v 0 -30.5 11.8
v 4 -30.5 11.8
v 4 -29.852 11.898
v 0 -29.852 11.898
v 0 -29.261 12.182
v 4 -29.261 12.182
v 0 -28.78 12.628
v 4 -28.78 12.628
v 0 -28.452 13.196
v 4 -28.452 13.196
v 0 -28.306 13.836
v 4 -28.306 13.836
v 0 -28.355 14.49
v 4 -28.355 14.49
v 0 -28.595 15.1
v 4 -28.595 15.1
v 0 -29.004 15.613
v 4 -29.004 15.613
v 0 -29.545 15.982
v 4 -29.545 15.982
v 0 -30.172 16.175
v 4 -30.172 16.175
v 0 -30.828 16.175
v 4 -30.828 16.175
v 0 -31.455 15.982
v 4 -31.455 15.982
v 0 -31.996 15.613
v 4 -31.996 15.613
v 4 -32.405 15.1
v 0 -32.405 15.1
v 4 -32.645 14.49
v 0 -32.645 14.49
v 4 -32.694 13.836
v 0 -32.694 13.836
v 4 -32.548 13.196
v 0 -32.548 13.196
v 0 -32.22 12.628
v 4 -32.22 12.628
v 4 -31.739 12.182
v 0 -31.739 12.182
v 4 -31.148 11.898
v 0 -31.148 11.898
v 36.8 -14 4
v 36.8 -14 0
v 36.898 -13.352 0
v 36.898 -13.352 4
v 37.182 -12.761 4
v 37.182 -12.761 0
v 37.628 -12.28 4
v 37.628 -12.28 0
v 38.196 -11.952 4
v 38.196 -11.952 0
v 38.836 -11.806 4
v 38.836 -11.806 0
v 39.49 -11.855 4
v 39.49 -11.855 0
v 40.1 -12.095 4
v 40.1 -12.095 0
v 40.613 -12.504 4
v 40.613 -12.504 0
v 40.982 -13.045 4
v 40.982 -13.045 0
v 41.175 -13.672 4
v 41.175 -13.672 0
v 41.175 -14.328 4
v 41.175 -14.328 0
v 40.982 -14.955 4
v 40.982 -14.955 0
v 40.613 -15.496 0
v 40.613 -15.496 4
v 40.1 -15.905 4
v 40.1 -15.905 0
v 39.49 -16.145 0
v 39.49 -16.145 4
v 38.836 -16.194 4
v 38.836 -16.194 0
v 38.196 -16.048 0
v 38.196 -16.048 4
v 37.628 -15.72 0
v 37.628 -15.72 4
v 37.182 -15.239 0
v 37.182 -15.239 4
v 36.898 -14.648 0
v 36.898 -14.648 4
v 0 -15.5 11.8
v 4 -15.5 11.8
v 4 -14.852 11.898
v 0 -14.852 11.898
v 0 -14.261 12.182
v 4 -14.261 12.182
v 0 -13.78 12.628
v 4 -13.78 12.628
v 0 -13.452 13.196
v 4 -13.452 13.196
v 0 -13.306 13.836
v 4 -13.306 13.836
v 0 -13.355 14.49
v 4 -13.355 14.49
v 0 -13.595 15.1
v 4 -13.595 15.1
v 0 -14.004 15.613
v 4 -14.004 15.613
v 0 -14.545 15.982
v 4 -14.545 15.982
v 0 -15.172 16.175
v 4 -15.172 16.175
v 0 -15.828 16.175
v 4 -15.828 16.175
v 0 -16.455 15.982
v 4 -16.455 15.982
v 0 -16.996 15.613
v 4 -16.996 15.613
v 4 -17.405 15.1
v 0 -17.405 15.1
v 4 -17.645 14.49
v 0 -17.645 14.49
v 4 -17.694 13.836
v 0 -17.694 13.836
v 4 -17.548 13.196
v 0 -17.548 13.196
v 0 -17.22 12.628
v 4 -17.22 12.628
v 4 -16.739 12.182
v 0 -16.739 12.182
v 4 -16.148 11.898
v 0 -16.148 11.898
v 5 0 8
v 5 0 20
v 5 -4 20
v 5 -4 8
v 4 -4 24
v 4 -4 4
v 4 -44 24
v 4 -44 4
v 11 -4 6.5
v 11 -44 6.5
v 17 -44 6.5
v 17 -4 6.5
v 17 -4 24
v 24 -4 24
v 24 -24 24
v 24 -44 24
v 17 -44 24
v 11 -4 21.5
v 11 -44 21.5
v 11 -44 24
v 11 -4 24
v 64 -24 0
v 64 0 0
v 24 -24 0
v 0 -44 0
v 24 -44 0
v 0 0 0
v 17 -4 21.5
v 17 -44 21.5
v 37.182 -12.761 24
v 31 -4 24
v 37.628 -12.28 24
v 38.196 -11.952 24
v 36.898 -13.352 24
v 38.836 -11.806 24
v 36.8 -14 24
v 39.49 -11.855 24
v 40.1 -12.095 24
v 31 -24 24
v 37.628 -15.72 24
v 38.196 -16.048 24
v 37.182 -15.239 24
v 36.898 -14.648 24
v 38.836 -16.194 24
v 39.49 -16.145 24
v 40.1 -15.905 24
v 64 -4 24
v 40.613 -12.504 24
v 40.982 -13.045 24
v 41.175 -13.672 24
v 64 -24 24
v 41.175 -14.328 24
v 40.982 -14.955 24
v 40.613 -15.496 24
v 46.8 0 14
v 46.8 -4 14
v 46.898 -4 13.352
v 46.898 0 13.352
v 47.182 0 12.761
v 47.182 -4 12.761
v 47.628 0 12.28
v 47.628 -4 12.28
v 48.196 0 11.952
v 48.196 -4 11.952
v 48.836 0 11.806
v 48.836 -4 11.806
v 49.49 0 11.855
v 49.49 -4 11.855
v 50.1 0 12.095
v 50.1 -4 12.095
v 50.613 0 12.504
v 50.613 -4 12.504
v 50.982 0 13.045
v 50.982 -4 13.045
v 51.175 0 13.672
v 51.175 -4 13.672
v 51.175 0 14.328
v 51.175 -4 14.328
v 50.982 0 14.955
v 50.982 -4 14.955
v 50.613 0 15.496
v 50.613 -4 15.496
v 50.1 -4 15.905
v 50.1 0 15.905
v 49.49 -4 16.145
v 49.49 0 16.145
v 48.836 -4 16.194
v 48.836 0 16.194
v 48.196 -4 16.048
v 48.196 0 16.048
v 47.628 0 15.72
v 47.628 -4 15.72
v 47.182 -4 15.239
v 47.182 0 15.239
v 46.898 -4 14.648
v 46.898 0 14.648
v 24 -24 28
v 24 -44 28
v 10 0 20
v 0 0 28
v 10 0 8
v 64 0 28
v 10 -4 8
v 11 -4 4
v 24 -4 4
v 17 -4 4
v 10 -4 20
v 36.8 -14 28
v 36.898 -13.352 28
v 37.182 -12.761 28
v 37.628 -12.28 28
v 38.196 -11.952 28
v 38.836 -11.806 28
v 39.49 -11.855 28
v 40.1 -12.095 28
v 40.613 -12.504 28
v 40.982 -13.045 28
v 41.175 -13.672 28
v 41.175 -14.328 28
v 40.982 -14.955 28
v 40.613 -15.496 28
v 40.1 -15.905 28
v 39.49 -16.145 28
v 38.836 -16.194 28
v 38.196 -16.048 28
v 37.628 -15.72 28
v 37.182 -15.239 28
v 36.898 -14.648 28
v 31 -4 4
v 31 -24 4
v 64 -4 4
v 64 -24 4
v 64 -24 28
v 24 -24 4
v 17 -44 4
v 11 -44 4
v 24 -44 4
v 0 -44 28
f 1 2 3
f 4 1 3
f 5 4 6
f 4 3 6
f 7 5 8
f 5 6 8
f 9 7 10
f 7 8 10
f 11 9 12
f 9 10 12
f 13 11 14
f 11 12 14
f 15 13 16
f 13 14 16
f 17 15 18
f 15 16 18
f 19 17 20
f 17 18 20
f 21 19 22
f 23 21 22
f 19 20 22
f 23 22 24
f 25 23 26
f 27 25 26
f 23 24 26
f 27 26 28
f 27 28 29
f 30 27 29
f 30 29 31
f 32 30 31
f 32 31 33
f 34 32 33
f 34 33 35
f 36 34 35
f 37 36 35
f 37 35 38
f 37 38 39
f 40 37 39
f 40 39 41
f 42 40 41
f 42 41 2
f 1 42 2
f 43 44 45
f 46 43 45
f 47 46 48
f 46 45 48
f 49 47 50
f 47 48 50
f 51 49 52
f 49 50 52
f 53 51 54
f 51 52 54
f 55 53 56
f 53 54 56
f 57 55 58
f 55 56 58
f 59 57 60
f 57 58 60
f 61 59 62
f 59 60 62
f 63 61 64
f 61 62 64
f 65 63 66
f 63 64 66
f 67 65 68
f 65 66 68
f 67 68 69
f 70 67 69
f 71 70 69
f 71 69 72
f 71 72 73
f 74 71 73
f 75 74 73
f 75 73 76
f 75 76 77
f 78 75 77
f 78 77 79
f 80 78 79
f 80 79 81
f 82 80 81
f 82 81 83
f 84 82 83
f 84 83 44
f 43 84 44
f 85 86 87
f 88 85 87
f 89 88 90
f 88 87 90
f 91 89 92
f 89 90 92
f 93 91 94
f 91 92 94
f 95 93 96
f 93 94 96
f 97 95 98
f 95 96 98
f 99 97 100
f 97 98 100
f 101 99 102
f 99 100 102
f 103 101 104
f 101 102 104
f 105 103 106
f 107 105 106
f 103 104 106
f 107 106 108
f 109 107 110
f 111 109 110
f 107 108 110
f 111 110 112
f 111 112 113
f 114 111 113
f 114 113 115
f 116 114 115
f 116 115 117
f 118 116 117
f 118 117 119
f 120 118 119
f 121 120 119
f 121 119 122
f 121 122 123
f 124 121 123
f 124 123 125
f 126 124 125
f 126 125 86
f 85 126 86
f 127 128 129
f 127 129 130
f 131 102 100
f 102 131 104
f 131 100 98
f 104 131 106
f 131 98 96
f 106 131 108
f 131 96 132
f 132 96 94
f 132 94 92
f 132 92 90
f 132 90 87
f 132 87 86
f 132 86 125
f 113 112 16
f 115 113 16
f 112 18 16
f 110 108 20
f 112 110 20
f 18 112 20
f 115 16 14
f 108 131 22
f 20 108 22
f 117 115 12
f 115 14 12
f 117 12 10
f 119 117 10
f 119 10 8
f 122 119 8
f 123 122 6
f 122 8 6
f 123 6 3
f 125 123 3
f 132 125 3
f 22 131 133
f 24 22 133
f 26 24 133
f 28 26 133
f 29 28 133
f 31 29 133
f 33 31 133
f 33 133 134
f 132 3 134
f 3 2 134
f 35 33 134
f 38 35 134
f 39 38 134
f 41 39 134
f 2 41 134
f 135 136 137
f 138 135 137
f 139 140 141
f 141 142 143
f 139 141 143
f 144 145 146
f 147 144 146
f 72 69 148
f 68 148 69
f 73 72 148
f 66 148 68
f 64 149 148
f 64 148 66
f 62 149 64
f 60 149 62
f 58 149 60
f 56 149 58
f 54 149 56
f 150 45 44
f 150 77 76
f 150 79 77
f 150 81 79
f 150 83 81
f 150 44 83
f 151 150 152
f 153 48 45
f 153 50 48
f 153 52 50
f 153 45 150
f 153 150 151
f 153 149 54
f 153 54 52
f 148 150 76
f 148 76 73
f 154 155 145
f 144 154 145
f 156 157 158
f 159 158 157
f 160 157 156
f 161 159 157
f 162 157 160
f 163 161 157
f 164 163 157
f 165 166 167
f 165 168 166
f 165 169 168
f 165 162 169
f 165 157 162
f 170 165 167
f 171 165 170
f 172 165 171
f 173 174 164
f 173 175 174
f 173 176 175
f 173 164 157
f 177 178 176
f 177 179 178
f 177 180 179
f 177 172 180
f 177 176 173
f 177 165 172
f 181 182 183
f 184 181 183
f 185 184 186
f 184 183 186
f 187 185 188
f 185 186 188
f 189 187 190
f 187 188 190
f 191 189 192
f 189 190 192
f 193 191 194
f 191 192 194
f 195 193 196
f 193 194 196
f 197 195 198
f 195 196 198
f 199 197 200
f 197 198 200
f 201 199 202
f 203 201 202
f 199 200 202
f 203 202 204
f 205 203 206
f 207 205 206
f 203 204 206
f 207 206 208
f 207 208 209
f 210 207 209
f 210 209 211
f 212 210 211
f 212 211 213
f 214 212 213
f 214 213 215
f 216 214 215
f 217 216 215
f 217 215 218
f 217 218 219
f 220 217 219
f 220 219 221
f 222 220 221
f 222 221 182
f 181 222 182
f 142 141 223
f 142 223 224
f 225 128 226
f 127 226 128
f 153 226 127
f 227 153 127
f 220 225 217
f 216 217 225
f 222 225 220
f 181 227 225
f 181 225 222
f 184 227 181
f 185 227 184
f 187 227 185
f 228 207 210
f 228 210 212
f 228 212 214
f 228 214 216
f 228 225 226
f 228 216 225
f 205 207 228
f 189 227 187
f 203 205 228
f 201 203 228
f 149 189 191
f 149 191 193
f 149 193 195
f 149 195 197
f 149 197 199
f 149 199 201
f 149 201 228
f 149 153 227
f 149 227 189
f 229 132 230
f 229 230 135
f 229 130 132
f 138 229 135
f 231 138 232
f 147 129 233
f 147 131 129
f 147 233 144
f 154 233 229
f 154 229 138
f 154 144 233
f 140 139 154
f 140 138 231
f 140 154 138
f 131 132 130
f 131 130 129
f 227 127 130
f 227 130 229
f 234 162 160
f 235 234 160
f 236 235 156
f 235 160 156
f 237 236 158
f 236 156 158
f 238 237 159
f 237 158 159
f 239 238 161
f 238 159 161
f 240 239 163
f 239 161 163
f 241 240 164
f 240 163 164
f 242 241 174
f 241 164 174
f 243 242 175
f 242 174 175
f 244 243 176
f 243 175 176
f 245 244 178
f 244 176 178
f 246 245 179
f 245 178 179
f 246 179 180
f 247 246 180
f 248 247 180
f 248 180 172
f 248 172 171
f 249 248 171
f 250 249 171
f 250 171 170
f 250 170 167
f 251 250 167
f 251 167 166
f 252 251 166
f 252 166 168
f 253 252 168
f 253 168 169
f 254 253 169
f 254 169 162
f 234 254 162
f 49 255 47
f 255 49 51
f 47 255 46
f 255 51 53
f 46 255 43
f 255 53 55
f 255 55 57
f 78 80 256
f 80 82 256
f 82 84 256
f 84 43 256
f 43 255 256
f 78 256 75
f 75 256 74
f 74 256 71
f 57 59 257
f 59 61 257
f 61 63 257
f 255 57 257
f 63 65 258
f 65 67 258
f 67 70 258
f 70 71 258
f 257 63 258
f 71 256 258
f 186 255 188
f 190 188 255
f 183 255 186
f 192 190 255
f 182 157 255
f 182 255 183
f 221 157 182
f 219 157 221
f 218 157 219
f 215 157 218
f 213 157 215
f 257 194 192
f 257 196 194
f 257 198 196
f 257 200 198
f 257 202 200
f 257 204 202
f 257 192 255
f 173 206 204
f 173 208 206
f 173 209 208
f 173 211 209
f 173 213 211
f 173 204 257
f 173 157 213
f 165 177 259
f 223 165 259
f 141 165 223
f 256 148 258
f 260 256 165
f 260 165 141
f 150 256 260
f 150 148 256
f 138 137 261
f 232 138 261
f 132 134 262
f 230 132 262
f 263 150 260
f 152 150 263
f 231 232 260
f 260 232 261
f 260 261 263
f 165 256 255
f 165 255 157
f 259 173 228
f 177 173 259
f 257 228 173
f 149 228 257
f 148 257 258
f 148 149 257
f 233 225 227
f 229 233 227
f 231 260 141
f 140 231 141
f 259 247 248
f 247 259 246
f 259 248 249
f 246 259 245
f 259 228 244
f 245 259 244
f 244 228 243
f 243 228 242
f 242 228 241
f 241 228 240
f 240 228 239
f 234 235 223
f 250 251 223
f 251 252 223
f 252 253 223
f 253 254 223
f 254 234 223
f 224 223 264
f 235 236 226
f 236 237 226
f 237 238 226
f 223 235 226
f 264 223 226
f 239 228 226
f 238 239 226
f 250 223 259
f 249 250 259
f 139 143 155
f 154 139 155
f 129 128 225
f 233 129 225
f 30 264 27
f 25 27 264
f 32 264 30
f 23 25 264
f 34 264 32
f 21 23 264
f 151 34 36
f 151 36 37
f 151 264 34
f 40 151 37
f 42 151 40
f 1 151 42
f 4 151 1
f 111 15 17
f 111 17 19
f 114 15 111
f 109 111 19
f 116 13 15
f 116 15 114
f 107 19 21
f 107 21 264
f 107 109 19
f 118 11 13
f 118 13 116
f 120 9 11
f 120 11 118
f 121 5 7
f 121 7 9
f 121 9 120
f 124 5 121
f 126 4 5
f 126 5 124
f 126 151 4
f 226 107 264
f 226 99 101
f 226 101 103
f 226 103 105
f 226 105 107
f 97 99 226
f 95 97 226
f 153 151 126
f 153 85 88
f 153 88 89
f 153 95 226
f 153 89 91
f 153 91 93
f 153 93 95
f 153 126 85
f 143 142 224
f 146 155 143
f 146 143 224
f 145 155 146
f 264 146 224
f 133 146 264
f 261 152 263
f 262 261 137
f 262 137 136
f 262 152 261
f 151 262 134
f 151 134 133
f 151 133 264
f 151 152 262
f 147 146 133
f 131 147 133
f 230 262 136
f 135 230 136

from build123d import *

# Parameters (mm, degrees)
BOSS_EXTRU_1_DEPTH      = 28
ENL_V_MAT_EXTRU_1_DEPTH = 40
ESQUISSE3_W             = 33
ESQUISSE3_H             = 20
ENL_V_MAT_EXTRU_2_DEPTH = 20
D_GAGEMENT_M41_D        = 4.4
D_GAGEMENT_M41_DEPTH    = 5
D_GAGEMENT_M42_D        = 4.4
D_GAGEMENT_M43_D        = 4.4
D_GAGEMENT_M43_DEPTH    = 5
ESQUISSE13_W            = 5
ESQUISSE13_H            = 12
ENL_V_MAT_EXTRU_4_DEPTH = 10


with BuildPart() as part:
    # Esquisse1 → Boss.-Extru.1 (new body)
    with BuildSketch(Plane.XY):
        Polygon((0, 0), (64, 0), (64, -24), (24, -24), (24, -44), (0, -44), align=None)
    extrude(amount=BOSS_EXTRU_1_DEPTH)

    # Esquisse2 → Enlèv. mat.-Extru.1 (cut)
    with BuildSketch(Plane.XZ.offset(44)):
        Polygon((24, 24), (17, 24), (17, 21.5), (11, 21.5), (11, 24), (4, 24), (4, 4), (11, 4), (11, 6.5), (17, 6.5), (17, 4), (24, 4), align=None)
    extrude(amount=-ENL_V_MAT_EXTRU_1_DEPTH, mode=Mode.SUBTRACT)

    # Esquisse3 → Enlèv. mat.-Extru.2 (cut)
    with BuildSketch(Plane.XZ.offset(24)):
        with Locations((47.5, 14)):
            Rectangle(ESQUISSE3_W, ESQUISSE3_H)
    extrude(amount=-ENL_V_MAT_EXTRU_2_DEPTH, mode=Mode.SUBTRACT)

    # Dégagement M41
    with Locations(Plane.ZY):
        with Locations((14, -15.5), (14, -30.5)):
            Hole(D_GAGEMENT_M41_D / 2, depth=D_GAGEMENT_M41_DEPTH)

    # Dégagement M42 (through all)
    with Locations(Plane.XY.offset(28)):
        with Locations((39, -14)):
            Hole(D_GAGEMENT_M42_D / 2)

    # Dégagement M43
    with Locations(Plane(origin=(0, 0, 0), x_dir=(1, 0, 0), z_dir=(0, 1, 0))):
        with Locations((49, -14)):
            Hole(D_GAGEMENT_M43_D / 2, depth=D_GAGEMENT_M43_DEPTH)

    # Esquisse13 → Enlèv. mat.-Extru.4 (cut)
    with BuildSketch(Plane(origin=(0, 0, 0), x_dir=(1, 0, 0), z_dir=(0, 1, 0))):
        with Locations((7.5, -14)):
            Rectangle(ESQUISSE13_W, ESQUISSE13_H)
    extrude(amount=-ENL_V_MAT_EXTRU_4_DEPTH, mode=Mode.SUBTRACT)


solid = part.part
